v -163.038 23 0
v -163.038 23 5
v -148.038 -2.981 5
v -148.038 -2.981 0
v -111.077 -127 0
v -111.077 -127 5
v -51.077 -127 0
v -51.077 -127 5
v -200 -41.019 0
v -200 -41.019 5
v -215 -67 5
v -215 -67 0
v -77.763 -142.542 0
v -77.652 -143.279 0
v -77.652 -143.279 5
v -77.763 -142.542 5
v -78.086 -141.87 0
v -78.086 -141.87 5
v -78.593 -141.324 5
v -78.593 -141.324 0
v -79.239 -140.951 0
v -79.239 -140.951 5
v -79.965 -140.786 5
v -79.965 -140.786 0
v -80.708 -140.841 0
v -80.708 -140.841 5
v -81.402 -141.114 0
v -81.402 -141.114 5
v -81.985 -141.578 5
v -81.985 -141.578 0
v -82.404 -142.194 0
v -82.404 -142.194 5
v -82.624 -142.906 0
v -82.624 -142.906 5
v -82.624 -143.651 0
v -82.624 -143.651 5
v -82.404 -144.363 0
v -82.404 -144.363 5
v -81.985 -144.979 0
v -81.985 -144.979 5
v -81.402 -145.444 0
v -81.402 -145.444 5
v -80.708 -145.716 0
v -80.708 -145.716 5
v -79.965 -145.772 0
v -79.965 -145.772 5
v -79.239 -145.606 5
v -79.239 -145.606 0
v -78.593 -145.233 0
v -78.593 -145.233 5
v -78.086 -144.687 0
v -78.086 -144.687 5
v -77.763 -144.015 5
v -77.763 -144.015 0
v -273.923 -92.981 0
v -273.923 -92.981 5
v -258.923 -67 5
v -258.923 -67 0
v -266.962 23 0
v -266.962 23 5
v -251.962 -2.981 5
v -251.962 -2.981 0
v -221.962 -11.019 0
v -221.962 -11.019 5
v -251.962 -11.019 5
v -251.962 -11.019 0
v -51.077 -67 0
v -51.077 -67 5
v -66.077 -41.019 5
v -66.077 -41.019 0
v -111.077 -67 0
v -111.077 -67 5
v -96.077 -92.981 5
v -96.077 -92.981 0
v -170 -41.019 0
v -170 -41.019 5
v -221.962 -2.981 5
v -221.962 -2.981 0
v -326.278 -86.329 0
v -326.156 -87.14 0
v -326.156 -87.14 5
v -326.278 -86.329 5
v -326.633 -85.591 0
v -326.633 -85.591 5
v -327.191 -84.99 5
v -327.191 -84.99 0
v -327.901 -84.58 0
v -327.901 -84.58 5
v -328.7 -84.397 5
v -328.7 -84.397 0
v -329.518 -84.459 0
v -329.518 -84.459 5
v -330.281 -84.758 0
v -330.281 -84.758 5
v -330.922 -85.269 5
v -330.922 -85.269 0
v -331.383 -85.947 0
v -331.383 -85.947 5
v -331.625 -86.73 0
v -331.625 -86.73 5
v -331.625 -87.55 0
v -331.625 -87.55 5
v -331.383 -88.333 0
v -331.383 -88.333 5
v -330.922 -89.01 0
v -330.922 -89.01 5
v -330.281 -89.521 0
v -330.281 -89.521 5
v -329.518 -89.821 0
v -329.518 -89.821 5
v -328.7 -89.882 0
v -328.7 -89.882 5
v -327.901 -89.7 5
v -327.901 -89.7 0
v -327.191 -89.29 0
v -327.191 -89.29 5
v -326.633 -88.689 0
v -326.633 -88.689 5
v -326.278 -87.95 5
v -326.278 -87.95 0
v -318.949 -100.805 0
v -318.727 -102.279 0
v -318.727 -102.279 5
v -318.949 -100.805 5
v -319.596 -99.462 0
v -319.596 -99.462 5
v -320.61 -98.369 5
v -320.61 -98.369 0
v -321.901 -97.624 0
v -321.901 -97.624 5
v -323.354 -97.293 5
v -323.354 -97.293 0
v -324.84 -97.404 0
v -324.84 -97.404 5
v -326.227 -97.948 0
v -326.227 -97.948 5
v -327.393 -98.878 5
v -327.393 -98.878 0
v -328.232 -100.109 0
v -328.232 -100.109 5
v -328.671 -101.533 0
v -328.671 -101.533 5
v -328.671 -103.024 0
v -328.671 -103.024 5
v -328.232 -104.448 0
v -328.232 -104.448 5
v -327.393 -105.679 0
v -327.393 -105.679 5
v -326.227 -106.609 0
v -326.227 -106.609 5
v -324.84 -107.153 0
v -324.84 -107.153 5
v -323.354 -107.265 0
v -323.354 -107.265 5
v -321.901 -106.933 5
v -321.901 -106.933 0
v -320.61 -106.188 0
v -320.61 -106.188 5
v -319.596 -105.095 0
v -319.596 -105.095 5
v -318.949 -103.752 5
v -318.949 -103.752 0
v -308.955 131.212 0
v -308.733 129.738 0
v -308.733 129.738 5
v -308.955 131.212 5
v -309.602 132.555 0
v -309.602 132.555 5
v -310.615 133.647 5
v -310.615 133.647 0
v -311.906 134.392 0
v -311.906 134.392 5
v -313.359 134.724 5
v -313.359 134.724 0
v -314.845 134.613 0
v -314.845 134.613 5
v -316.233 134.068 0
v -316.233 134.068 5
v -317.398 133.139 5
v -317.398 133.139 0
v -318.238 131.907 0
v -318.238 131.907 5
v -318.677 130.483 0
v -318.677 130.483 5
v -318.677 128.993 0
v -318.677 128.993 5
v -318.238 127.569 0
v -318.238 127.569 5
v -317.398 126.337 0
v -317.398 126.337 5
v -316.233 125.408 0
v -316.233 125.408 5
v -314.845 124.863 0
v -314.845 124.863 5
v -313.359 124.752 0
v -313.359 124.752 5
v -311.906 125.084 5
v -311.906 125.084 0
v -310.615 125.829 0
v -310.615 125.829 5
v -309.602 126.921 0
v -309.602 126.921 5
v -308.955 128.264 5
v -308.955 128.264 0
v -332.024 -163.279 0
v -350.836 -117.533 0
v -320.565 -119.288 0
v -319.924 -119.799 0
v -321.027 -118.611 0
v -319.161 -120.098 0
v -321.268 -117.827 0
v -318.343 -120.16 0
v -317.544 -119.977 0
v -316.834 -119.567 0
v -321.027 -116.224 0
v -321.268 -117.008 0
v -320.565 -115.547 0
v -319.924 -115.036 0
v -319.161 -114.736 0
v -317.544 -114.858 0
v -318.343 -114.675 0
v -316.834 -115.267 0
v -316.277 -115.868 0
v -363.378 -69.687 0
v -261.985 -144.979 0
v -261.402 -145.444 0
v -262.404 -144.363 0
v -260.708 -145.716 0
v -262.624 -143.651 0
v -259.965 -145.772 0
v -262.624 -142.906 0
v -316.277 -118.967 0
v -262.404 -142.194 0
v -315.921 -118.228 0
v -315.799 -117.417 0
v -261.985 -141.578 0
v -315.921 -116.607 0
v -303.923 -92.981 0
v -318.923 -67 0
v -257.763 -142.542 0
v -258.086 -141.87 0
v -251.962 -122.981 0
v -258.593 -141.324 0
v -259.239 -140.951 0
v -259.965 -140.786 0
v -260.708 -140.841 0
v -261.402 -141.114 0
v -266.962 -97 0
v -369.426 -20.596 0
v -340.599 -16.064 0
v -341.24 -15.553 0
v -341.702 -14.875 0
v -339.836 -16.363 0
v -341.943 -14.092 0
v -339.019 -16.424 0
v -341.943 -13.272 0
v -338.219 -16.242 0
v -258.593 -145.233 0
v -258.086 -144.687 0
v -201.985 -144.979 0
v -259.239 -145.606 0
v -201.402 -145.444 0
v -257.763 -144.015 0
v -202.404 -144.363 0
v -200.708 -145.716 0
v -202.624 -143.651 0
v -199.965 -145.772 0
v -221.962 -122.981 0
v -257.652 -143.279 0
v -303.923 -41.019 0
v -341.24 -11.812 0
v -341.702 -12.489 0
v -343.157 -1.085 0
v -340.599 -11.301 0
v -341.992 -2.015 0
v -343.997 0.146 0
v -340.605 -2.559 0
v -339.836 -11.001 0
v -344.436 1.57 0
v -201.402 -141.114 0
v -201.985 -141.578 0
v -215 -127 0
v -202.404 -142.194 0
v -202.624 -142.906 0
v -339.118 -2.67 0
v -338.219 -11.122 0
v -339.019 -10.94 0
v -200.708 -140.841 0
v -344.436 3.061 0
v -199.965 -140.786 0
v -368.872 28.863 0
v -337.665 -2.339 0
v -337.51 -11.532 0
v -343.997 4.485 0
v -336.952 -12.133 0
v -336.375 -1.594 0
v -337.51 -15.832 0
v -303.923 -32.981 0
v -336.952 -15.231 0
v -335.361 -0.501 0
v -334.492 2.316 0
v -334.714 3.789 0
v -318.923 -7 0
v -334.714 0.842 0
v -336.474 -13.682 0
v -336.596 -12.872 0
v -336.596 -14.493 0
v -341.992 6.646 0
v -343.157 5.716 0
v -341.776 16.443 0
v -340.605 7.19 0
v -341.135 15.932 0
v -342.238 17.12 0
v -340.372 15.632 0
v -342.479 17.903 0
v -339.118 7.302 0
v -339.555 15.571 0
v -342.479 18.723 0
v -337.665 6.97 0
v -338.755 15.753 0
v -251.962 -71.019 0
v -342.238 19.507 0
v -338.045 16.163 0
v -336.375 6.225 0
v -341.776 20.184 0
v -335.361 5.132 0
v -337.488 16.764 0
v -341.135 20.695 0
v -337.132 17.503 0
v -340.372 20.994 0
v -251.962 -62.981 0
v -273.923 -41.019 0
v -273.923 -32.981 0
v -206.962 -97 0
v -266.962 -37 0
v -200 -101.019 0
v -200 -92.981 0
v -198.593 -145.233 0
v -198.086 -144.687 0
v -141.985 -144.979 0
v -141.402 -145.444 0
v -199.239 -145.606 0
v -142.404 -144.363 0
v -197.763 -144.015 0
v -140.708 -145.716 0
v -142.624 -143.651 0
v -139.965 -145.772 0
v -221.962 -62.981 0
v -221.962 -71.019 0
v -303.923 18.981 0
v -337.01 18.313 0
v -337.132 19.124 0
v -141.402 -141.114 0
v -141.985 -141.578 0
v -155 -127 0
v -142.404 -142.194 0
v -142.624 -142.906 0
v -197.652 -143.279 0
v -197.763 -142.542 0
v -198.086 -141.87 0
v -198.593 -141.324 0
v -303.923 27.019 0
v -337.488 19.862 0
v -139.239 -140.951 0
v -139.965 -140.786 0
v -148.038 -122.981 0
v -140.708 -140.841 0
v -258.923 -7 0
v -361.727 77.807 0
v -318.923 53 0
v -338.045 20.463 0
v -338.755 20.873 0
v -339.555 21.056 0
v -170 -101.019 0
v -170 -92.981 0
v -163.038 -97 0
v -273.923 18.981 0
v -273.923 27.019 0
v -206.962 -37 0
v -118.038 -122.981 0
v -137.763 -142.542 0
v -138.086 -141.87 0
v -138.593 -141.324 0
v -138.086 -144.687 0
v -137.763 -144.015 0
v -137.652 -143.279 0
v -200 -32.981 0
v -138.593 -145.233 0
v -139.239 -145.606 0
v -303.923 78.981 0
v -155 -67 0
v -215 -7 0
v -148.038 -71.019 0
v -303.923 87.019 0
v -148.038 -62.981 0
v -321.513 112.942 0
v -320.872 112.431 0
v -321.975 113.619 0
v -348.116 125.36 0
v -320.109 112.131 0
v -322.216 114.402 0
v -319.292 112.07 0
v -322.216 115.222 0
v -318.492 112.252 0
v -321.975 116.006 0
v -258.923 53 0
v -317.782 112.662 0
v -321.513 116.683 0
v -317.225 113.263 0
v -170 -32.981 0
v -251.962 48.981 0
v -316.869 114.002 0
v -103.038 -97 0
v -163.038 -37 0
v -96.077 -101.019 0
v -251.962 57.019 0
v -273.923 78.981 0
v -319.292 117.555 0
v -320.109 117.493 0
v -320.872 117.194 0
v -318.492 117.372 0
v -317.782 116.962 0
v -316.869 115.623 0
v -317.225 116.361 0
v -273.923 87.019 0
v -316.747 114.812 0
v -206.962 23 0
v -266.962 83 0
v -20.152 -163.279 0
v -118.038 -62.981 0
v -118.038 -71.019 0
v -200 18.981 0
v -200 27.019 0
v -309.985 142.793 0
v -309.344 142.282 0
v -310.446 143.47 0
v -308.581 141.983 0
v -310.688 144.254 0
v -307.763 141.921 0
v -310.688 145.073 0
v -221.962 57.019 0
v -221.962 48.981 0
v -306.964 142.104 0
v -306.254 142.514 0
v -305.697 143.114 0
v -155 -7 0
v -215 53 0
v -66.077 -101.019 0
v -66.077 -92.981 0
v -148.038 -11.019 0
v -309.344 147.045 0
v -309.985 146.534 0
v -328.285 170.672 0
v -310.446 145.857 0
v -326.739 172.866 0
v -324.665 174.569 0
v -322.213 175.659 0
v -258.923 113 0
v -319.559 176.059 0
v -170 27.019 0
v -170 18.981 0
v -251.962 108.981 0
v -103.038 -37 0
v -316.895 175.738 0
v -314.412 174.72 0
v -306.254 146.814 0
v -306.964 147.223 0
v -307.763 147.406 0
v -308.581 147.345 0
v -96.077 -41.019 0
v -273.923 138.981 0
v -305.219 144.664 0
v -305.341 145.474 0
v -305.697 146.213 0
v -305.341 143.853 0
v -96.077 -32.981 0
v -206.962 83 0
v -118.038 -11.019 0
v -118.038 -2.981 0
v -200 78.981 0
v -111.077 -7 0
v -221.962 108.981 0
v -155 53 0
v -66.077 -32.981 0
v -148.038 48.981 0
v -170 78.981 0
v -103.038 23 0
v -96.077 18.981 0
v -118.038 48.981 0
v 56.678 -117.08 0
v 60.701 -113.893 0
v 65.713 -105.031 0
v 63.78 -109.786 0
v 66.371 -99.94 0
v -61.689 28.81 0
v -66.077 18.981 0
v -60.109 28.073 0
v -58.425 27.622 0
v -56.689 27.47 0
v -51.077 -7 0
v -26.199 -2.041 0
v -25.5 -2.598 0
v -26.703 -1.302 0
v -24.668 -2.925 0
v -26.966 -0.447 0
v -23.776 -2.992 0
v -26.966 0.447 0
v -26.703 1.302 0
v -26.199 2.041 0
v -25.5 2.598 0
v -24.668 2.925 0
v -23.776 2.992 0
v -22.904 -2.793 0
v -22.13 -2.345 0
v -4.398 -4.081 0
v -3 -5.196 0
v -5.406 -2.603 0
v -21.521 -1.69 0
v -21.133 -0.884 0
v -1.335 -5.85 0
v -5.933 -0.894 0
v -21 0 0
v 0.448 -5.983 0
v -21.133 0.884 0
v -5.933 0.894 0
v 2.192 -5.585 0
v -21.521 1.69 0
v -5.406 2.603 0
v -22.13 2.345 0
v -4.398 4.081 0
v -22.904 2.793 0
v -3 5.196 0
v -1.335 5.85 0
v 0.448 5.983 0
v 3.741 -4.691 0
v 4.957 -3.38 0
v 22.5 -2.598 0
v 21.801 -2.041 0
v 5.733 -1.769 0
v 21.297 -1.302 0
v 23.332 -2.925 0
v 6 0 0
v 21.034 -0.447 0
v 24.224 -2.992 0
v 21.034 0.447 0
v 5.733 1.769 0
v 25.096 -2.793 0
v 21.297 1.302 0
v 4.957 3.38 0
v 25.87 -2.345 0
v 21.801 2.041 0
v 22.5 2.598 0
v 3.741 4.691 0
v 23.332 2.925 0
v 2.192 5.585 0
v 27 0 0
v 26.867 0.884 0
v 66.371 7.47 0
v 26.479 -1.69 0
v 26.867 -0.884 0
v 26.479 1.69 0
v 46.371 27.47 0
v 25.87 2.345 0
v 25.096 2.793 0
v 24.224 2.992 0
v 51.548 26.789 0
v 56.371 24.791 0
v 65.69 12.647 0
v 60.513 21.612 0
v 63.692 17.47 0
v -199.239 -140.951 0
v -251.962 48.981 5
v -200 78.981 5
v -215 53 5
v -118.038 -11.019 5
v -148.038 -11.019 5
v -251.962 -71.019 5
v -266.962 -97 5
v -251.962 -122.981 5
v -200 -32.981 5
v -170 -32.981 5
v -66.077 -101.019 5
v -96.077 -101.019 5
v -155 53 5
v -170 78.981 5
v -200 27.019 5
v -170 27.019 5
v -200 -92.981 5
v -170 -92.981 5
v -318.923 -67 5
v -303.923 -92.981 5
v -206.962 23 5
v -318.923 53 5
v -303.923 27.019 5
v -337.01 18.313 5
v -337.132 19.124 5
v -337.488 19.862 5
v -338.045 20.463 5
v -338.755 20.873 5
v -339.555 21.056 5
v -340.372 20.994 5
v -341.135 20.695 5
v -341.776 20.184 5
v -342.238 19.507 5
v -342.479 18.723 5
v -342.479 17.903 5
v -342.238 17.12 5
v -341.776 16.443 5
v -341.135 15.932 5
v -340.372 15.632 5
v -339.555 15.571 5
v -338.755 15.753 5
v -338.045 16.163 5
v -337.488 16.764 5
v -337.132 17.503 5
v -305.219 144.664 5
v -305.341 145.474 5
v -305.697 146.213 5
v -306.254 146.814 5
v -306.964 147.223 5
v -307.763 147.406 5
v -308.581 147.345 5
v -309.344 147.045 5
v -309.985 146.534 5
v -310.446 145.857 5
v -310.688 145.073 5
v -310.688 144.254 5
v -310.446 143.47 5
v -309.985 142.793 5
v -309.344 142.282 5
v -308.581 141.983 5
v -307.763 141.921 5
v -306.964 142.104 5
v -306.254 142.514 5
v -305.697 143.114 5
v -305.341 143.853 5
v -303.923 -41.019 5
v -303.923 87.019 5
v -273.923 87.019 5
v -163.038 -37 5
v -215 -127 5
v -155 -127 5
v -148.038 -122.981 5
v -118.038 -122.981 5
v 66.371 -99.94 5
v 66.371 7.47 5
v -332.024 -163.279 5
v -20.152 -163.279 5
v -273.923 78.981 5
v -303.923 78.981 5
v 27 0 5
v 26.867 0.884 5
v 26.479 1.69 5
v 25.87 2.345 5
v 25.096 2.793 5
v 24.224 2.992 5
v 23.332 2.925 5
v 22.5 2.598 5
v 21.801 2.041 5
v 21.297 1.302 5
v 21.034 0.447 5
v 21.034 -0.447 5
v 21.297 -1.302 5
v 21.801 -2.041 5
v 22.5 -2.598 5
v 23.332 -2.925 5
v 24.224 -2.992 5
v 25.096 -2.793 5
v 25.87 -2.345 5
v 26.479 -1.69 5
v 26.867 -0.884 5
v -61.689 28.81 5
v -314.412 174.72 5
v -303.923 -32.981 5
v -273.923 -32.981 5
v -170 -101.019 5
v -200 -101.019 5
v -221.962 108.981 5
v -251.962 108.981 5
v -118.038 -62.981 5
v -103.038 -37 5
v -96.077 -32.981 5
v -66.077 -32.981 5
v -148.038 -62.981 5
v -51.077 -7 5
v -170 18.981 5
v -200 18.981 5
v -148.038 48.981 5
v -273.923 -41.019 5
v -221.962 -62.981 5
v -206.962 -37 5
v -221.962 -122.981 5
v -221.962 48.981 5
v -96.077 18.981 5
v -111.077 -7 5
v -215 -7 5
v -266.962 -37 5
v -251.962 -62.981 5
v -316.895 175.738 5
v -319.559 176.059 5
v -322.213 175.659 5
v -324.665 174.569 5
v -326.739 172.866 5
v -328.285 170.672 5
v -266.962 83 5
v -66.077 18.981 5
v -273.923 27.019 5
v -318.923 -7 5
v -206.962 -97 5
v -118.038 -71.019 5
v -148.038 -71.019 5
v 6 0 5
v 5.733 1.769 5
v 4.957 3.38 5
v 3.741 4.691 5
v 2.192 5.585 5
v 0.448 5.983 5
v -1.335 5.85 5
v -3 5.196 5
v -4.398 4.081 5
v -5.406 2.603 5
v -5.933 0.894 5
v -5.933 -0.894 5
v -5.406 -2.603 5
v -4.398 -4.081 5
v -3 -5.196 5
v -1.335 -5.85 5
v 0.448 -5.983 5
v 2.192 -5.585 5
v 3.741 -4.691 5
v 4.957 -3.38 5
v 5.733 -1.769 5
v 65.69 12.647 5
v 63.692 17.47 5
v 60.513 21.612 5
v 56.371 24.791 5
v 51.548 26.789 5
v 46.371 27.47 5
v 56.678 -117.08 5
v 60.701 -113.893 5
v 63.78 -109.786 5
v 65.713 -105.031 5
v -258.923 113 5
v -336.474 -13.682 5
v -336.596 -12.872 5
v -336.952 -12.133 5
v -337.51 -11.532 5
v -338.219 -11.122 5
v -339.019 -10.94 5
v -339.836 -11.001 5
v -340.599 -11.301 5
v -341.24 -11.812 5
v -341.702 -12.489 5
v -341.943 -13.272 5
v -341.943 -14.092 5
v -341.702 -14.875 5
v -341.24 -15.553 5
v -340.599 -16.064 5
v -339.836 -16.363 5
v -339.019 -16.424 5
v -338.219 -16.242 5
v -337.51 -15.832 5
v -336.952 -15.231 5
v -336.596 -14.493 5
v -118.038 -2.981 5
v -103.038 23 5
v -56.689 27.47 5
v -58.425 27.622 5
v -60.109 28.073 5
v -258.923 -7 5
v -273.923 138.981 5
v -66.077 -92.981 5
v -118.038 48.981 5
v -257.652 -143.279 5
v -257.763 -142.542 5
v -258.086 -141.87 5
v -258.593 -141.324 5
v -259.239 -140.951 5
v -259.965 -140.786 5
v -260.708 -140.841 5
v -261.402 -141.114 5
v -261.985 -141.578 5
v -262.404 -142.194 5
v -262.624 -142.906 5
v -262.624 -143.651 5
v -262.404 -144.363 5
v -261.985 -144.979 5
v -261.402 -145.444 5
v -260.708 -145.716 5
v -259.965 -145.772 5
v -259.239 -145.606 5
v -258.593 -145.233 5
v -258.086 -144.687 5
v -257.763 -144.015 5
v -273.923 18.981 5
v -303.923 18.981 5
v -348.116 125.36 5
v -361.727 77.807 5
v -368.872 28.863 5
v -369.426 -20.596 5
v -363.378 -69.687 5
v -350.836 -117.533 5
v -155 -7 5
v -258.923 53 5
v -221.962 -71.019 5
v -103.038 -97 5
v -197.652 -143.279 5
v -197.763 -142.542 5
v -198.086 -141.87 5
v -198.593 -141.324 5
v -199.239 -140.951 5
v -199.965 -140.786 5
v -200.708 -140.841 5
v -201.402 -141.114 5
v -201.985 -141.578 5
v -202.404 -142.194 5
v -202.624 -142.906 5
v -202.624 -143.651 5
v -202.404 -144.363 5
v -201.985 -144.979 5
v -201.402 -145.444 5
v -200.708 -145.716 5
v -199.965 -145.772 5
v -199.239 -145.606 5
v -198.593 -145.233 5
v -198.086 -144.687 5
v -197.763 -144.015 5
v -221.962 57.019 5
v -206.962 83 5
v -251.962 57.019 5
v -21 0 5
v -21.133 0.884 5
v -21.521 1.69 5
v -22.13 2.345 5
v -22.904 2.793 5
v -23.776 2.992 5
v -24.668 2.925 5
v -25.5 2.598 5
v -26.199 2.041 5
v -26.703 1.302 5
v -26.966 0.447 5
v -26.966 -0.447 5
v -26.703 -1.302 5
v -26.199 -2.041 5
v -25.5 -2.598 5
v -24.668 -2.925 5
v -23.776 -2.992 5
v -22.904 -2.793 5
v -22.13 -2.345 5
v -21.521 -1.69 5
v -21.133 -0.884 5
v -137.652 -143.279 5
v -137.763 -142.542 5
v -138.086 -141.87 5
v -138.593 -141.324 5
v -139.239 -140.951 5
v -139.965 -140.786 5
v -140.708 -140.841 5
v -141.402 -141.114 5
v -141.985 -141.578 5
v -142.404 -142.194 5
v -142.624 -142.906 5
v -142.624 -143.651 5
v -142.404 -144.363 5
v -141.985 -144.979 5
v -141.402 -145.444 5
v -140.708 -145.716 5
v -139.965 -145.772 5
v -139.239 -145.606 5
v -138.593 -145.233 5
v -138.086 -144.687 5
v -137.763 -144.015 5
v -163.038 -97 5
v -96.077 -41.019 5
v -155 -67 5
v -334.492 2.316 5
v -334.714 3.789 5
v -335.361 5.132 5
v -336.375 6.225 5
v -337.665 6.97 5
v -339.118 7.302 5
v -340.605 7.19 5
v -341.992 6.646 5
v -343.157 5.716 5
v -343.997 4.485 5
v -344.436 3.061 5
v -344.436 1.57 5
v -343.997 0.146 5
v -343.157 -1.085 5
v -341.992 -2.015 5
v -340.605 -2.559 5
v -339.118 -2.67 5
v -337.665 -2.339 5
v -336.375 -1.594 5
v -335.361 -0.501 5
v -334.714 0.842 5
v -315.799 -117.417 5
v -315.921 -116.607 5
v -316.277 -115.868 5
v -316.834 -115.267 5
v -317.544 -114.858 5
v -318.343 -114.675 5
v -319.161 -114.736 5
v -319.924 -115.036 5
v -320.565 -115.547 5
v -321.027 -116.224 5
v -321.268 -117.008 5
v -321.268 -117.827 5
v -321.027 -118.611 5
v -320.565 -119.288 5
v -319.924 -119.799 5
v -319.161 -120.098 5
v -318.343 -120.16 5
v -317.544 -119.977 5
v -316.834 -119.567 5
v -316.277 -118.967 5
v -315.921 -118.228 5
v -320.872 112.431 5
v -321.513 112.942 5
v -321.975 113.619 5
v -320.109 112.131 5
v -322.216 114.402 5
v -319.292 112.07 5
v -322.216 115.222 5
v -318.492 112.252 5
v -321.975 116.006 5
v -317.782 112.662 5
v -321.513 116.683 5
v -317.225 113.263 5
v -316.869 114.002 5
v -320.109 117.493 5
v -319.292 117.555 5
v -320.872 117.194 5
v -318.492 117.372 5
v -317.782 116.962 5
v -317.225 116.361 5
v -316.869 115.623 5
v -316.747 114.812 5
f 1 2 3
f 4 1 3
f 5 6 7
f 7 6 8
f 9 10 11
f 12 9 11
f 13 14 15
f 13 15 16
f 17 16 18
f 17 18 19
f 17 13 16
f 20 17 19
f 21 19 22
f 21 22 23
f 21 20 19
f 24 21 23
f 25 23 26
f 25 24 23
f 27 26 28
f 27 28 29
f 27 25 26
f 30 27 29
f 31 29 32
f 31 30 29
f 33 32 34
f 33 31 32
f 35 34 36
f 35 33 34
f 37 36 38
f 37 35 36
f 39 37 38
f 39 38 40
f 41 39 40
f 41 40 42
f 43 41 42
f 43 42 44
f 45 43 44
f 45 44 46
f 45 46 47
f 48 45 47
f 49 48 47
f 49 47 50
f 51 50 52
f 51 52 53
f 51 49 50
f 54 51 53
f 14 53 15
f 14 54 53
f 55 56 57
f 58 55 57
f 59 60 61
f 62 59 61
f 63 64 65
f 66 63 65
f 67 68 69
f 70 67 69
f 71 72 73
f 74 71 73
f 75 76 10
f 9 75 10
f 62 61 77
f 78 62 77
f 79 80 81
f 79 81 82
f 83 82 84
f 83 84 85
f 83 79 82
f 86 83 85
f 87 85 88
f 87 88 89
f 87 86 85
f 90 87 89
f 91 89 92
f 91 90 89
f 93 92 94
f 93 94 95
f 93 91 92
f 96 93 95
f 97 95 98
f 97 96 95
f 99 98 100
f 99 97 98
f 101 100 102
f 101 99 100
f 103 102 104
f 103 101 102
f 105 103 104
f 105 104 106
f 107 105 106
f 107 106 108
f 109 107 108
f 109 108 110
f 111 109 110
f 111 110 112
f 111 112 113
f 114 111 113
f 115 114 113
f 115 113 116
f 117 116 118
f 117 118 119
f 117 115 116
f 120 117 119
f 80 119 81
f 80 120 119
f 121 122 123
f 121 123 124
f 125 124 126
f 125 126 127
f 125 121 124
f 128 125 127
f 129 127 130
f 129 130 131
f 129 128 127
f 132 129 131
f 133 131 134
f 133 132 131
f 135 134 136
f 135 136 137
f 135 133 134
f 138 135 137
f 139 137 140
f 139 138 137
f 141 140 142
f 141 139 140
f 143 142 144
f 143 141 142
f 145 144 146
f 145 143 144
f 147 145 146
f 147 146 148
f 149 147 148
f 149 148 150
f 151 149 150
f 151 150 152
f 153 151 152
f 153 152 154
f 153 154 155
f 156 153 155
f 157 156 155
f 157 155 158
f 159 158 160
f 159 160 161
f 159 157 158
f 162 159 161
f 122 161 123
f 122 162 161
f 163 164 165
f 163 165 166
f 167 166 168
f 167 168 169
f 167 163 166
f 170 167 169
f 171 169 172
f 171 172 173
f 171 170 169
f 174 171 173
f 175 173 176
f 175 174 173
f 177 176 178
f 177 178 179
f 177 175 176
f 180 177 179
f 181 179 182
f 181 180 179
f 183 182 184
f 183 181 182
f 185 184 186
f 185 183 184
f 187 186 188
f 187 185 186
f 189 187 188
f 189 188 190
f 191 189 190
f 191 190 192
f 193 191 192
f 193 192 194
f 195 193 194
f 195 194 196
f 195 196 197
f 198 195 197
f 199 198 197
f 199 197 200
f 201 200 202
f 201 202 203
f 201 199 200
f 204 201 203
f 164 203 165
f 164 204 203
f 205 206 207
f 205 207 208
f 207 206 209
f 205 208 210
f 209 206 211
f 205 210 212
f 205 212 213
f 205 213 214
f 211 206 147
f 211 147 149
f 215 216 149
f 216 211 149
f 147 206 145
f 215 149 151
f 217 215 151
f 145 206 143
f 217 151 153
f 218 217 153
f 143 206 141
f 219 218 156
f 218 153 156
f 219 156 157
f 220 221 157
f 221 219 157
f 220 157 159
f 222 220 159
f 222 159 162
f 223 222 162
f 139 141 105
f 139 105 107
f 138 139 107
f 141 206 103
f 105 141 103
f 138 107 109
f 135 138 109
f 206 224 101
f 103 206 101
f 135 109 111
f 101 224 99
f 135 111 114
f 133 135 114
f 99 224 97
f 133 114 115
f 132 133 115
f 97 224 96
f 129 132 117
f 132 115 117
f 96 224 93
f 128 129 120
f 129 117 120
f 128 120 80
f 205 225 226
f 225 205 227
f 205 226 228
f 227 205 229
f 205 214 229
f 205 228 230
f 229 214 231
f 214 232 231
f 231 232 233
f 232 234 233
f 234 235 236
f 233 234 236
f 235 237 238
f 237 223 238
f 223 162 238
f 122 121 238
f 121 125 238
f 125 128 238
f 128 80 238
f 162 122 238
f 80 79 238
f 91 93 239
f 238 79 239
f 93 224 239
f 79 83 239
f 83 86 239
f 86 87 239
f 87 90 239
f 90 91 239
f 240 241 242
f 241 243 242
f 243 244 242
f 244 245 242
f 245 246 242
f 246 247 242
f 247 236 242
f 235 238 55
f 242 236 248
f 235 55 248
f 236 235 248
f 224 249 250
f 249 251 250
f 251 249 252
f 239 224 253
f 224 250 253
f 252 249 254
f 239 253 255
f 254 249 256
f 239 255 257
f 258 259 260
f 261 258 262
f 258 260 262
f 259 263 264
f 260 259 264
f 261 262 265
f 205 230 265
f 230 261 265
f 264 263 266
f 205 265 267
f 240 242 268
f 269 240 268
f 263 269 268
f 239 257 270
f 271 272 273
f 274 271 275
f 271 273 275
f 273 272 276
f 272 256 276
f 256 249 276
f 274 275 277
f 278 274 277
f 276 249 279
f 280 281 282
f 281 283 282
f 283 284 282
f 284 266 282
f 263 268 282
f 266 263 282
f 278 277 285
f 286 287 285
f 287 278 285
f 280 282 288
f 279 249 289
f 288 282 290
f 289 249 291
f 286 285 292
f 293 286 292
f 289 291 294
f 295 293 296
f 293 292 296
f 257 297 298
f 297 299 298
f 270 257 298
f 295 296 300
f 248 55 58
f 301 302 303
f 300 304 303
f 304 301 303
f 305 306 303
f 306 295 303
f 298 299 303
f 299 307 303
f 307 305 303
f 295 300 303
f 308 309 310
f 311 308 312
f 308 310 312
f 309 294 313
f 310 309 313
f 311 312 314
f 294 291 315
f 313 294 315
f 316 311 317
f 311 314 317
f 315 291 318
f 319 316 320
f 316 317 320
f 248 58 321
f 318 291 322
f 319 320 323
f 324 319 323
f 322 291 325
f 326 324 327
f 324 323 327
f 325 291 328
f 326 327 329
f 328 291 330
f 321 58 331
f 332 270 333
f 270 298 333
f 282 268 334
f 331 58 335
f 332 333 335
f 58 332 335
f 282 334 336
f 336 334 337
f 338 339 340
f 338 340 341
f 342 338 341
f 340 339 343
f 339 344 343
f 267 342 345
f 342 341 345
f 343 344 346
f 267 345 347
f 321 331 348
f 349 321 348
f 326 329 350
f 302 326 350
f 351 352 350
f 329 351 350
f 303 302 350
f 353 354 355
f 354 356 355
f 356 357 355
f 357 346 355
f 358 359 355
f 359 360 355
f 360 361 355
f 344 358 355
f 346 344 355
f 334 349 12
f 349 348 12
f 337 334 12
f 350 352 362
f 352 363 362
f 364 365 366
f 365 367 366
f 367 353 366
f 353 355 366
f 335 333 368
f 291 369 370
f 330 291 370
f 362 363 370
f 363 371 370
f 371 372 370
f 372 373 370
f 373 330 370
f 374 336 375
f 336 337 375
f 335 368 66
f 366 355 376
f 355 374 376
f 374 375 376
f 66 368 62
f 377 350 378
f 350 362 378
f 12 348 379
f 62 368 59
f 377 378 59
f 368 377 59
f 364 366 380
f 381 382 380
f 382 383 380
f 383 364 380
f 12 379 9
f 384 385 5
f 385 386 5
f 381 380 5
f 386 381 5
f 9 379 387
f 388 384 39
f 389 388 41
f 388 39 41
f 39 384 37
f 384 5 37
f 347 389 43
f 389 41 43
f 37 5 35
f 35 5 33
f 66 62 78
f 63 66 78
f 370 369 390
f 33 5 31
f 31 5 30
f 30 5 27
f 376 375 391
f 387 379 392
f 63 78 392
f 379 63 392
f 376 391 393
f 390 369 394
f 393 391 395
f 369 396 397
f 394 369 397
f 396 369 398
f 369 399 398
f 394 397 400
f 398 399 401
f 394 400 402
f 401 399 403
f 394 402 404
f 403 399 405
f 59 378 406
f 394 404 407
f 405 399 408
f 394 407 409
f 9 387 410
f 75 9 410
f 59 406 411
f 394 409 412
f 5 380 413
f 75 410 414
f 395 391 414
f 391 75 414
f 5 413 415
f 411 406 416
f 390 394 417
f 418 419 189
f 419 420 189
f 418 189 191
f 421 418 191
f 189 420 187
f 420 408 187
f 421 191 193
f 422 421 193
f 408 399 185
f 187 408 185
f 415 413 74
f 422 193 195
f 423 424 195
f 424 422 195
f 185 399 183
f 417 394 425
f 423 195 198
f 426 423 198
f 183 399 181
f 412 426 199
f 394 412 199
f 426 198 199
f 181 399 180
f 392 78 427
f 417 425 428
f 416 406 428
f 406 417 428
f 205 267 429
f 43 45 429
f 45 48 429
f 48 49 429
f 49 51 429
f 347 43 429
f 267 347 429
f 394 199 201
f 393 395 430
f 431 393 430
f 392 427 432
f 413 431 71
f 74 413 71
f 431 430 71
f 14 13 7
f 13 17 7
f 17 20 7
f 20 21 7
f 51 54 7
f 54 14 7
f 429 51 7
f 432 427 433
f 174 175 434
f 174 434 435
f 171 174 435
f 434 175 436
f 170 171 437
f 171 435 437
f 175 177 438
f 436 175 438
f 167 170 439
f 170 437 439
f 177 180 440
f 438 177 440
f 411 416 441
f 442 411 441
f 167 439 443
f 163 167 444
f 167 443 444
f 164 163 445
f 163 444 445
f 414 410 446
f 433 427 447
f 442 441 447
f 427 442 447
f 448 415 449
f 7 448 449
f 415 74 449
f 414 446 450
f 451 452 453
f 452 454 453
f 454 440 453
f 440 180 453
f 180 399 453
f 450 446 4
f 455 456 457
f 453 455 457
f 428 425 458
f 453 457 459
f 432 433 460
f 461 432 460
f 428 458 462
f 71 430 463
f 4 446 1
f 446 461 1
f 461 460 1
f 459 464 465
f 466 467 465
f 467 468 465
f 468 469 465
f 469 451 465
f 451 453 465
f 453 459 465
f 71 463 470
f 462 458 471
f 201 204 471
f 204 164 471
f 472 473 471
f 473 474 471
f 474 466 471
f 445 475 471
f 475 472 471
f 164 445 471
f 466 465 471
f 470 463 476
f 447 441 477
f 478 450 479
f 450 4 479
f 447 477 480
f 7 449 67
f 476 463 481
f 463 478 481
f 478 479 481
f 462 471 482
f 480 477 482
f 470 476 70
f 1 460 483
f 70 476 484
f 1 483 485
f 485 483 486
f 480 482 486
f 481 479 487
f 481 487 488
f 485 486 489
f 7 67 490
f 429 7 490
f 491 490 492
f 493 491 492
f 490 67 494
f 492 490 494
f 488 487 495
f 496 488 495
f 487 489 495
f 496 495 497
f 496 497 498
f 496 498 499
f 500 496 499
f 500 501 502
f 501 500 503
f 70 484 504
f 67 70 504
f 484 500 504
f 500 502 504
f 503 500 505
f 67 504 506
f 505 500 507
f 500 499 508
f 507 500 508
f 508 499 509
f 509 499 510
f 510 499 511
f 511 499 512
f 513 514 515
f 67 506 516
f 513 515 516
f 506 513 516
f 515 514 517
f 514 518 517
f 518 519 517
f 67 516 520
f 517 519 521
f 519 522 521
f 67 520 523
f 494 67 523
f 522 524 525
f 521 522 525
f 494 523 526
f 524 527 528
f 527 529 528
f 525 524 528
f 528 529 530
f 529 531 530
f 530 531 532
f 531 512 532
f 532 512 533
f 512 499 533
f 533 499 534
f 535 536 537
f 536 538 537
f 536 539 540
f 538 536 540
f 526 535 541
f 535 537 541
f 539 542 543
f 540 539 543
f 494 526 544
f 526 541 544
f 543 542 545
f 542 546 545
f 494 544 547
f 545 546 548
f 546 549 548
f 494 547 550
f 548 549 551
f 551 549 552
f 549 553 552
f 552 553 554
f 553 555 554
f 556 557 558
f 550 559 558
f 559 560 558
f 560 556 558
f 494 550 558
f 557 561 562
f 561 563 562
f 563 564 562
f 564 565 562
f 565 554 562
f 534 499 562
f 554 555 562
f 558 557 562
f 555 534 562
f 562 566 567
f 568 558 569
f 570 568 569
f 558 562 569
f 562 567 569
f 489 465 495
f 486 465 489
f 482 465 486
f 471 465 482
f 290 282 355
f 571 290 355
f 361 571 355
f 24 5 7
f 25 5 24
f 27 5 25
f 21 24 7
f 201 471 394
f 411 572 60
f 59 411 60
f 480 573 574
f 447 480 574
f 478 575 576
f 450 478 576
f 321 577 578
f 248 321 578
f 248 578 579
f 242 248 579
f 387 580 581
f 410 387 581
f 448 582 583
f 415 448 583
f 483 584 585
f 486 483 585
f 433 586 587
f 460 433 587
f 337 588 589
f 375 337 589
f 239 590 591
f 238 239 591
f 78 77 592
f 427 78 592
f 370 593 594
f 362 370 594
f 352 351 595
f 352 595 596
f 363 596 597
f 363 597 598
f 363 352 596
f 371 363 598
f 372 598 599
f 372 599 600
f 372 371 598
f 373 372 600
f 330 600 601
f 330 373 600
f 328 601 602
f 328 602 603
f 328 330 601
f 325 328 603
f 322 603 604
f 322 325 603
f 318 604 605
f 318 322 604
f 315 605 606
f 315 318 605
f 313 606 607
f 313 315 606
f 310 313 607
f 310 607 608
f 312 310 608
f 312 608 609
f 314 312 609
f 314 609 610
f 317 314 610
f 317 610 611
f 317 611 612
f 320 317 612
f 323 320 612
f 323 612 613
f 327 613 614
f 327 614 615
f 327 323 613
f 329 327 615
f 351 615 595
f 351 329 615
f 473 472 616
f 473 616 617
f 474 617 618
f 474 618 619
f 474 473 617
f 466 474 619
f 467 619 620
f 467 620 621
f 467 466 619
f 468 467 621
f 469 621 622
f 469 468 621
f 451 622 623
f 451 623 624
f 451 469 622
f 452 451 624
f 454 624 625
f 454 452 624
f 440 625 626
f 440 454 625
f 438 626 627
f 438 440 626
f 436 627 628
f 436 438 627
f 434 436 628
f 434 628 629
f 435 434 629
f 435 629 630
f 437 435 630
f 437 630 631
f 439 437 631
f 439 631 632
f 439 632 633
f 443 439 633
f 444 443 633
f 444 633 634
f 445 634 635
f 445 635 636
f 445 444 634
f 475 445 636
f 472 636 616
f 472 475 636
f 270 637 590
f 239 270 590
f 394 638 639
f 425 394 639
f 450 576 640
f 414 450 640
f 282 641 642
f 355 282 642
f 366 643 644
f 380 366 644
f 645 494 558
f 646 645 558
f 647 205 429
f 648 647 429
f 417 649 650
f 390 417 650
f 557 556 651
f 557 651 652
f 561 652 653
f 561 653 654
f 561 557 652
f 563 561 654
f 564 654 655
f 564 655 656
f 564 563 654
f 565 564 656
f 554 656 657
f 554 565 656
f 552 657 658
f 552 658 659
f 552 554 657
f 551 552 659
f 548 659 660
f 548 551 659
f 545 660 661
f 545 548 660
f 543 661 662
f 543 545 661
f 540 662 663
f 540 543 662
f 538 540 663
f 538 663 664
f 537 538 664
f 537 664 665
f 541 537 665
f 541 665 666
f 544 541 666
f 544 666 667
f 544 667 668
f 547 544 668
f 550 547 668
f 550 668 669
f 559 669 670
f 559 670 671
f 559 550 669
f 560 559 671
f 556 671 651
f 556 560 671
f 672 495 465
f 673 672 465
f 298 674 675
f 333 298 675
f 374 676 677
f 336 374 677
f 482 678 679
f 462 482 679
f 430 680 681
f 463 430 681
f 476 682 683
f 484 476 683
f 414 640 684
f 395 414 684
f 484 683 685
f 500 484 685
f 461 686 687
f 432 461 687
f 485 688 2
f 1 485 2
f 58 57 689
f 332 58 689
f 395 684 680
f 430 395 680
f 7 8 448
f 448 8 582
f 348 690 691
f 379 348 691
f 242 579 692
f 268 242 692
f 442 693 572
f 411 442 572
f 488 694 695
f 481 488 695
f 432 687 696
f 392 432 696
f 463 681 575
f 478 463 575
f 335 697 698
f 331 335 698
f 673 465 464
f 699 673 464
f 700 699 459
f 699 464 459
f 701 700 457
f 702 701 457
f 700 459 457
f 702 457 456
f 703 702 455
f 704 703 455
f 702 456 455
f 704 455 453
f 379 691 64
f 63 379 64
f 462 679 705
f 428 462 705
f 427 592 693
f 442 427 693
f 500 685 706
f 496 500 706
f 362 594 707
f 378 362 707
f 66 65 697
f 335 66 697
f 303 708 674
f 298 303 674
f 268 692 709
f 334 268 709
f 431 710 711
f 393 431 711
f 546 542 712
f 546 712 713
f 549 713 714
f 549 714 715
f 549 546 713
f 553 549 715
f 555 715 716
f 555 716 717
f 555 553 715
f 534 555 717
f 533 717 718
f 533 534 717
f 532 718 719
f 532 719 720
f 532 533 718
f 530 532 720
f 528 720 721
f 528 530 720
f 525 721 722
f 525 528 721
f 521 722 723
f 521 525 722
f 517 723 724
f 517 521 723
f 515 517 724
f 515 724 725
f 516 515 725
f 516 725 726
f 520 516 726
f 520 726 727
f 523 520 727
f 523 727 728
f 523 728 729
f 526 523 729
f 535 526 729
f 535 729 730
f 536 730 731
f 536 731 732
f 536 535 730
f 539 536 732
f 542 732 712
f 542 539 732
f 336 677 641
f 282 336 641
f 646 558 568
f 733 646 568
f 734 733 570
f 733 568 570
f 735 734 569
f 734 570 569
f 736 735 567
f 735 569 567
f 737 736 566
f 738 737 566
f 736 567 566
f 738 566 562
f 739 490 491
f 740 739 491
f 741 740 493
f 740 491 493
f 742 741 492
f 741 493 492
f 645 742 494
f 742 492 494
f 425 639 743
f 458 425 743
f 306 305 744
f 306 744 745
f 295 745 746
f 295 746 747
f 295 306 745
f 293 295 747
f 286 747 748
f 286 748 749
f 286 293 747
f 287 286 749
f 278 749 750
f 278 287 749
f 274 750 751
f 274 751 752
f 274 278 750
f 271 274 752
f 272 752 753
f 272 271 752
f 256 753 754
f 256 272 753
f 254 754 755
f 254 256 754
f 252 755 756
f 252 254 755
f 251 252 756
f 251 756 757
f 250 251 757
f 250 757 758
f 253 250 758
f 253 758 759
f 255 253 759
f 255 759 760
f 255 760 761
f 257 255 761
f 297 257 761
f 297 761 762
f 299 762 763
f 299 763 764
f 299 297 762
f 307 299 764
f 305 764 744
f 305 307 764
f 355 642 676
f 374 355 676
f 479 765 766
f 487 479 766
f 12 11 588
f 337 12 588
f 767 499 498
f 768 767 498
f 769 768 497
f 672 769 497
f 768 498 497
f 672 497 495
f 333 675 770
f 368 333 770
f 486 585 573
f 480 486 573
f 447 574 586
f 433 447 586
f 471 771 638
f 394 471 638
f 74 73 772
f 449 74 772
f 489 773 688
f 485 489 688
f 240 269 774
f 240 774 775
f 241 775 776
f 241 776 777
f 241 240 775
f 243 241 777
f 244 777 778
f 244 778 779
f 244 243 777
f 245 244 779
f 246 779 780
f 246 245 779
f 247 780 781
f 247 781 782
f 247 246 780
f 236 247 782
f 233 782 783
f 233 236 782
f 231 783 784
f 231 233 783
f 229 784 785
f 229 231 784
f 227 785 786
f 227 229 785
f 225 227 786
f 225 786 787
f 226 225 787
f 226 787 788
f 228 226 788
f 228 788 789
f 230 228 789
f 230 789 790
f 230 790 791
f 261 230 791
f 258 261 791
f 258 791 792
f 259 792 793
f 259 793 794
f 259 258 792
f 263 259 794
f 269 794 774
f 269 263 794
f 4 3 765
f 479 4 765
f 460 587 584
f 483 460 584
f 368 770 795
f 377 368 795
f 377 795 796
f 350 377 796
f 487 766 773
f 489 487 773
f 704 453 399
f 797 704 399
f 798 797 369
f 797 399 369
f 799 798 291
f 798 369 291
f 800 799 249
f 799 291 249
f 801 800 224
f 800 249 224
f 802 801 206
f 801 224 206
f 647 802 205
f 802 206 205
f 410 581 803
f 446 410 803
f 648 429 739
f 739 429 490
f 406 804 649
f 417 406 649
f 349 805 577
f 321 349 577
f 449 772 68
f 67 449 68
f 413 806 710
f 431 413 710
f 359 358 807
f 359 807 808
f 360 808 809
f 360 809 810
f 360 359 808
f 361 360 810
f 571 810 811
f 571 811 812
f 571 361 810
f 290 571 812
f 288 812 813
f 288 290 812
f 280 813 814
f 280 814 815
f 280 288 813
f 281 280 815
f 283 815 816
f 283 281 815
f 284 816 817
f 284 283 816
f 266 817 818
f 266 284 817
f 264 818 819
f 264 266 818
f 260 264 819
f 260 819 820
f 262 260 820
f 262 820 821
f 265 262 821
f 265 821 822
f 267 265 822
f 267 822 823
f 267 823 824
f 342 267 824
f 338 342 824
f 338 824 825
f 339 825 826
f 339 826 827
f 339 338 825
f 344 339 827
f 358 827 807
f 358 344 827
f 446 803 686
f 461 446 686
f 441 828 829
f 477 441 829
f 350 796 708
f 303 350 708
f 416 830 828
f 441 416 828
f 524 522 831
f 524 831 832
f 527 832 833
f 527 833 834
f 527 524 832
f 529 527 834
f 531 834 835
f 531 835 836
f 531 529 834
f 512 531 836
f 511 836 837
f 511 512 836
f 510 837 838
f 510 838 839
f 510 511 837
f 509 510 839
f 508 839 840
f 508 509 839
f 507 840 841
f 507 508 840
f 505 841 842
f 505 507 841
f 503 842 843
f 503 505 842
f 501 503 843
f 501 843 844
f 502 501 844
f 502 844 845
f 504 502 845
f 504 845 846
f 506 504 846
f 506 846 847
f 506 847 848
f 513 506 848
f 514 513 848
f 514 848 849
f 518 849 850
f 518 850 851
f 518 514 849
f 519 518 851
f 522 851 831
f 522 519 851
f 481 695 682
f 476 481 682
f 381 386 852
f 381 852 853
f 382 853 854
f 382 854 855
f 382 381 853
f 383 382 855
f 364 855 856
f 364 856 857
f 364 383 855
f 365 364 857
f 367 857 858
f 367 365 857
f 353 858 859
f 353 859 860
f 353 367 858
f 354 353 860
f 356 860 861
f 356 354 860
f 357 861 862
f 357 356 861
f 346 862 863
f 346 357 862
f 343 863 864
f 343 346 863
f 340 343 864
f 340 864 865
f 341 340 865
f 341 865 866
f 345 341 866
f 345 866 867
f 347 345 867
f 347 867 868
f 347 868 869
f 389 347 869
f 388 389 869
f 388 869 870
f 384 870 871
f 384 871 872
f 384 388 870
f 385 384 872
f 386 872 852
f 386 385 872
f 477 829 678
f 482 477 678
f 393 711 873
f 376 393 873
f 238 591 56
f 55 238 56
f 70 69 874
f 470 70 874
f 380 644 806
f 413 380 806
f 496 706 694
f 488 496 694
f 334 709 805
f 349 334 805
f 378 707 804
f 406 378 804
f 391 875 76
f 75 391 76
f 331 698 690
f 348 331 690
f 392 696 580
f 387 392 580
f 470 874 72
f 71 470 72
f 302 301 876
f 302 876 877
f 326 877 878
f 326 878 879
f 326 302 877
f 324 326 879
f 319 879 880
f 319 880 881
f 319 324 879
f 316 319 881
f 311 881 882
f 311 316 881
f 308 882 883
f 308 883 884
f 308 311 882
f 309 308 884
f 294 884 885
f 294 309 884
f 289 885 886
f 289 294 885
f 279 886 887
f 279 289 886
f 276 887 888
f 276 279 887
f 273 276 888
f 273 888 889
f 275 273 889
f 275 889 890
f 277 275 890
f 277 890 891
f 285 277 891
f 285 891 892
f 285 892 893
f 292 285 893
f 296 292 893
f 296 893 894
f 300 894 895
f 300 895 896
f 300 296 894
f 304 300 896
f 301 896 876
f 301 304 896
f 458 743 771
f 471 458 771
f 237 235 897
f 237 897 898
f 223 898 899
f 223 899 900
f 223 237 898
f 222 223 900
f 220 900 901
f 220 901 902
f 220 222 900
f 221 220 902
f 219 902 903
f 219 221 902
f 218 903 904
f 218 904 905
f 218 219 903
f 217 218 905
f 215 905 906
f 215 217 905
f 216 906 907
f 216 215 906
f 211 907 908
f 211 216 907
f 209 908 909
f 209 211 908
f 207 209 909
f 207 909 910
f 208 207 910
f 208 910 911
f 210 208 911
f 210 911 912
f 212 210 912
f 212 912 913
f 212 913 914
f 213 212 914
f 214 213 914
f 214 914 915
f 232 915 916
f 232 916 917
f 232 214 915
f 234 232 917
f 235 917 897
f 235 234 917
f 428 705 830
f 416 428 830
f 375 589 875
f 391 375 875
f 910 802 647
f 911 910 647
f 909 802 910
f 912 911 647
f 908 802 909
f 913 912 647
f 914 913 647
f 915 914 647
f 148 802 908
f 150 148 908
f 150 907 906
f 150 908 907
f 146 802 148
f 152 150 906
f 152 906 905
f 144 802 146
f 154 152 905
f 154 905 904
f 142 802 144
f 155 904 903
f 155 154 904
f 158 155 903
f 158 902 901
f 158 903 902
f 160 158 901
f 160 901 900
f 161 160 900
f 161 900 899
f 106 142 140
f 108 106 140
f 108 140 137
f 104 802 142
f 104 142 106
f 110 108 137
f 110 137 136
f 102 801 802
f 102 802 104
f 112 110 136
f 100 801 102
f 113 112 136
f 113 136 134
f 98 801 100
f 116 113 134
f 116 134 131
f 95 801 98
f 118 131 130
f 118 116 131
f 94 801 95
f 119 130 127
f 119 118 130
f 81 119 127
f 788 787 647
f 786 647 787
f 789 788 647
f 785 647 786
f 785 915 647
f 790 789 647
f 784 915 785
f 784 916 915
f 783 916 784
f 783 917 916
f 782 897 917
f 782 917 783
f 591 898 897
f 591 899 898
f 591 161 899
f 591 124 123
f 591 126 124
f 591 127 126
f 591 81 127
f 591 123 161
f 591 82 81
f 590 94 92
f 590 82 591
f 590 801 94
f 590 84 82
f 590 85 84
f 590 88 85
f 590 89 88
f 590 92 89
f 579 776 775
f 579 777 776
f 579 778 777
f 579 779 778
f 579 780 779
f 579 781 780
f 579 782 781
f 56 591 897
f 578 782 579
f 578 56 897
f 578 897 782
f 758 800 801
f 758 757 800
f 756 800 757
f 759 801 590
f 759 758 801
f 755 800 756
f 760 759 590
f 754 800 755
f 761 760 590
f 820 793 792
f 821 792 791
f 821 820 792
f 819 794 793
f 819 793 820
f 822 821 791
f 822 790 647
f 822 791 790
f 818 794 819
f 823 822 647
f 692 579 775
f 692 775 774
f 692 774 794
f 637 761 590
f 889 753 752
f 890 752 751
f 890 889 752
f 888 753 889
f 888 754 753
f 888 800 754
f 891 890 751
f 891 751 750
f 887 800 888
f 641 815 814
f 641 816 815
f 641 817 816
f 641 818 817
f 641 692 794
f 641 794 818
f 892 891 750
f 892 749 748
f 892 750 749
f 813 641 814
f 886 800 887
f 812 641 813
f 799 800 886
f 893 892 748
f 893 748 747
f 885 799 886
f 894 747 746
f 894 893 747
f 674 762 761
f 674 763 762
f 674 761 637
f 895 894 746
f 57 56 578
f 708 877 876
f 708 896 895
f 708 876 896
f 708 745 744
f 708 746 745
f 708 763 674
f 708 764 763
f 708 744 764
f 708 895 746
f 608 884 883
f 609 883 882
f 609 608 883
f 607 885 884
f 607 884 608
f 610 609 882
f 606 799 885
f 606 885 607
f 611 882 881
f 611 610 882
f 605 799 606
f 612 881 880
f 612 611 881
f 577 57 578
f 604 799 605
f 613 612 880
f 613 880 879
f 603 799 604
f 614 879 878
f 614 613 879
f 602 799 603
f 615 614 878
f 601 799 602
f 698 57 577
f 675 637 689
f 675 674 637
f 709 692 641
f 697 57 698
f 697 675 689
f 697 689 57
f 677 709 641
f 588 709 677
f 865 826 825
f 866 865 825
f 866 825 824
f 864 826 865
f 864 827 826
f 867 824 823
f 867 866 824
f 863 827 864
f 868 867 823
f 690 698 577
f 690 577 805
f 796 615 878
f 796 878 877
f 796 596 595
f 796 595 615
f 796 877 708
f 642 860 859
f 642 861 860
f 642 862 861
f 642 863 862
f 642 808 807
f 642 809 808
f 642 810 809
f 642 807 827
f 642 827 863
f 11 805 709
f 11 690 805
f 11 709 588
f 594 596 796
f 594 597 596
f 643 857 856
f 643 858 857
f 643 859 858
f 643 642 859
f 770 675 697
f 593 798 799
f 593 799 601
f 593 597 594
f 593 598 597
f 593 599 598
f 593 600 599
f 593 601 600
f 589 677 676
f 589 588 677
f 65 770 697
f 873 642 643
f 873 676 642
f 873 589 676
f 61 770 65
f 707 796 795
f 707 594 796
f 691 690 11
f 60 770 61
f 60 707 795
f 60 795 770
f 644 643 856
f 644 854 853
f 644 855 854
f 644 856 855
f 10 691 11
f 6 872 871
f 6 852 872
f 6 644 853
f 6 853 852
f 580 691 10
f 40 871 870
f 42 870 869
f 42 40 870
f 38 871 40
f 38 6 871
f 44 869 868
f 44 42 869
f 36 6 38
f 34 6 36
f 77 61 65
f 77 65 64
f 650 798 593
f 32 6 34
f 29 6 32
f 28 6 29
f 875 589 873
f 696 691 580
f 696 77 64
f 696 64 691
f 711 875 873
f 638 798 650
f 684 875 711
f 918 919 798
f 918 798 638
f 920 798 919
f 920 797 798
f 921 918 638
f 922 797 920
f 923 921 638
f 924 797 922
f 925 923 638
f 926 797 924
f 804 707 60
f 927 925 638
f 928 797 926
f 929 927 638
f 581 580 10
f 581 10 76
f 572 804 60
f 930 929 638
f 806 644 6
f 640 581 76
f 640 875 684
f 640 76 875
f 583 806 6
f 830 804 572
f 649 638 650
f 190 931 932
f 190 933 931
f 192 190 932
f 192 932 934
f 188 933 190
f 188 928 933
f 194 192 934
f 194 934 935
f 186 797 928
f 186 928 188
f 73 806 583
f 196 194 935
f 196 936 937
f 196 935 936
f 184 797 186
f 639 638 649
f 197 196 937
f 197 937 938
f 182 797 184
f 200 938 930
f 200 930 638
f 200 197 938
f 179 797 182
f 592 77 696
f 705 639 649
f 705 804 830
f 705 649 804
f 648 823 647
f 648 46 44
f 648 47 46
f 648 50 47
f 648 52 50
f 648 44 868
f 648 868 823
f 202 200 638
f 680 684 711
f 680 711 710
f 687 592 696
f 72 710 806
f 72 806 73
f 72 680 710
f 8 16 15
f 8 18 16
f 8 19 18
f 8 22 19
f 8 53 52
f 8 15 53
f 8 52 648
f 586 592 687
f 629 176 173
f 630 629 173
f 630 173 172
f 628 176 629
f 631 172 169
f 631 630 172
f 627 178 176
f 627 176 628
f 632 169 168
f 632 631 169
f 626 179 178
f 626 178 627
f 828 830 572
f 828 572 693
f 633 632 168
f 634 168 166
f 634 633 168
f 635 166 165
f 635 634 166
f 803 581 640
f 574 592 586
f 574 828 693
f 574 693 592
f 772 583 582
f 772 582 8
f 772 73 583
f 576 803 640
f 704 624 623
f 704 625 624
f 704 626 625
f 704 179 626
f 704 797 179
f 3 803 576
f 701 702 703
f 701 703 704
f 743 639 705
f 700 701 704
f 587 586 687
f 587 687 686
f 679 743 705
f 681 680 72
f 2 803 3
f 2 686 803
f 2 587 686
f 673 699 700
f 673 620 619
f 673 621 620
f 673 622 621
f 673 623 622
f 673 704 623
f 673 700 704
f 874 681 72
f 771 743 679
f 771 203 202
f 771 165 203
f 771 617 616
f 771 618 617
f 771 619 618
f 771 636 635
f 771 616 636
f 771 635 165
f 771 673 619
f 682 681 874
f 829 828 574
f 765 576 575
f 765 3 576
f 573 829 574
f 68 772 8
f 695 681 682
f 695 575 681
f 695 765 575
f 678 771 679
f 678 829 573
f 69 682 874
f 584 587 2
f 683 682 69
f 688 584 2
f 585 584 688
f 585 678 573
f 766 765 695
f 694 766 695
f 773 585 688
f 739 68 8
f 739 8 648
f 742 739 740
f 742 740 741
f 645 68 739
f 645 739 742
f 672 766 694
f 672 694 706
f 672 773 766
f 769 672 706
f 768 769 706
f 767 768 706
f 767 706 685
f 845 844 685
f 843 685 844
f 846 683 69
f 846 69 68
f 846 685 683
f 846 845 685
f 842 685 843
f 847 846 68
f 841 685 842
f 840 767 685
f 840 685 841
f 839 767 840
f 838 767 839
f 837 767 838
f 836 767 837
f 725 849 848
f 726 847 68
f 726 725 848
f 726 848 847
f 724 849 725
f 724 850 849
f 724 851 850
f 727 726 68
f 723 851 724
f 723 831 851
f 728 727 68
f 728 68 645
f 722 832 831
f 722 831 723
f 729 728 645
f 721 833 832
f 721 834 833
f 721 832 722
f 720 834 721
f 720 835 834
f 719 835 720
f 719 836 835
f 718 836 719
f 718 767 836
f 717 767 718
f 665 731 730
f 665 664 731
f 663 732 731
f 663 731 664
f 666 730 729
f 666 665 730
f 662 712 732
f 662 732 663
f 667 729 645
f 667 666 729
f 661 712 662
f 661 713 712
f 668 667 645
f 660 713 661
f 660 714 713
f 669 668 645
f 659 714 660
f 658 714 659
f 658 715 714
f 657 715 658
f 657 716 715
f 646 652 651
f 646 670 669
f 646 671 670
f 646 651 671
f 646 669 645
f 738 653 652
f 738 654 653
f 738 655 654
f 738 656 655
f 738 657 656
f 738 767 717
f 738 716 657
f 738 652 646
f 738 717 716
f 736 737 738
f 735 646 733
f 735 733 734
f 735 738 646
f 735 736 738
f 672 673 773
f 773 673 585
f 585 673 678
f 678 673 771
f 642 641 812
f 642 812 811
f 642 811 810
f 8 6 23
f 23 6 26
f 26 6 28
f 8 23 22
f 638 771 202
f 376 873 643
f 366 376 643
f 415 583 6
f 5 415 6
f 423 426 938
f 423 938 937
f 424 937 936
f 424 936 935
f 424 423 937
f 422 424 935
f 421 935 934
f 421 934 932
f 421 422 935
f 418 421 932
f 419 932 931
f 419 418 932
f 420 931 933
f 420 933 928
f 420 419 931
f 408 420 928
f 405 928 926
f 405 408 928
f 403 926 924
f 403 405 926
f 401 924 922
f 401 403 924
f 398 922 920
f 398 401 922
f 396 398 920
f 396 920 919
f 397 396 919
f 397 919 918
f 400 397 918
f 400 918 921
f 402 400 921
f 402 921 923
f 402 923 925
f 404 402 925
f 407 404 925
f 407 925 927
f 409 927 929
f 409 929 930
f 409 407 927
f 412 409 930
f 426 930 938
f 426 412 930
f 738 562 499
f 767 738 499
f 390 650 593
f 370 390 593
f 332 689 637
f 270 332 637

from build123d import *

# Parameters (mm, degrees)
BOSS_EXTRUDE1_OUTLINE_R   = 2.75
BOSS_EXTRUDE1_OUTLINE_R_2 = 5
BOSS_EXTRUDE1_OUTLINE_R_3 = 2.499999993
BOSS_EXTRUDE1_OUTLINE_R_4 = 3
BOSS_EXTRUDE1_OUTLINE_R_5 = 6
BOSS_EXTRUDE1_DEPTH       = 5
CUT_EXTRUDE1_DEPTH        = 5


# Read off the part's stored shape, not the designer's step: Boss-Extrude1
with BuildPart() as part:
    # Boss-Extrude1 outline → Boss-Extrude1 (new body)
    with BuildSketch(Plane.XY):
        with BuildLine():
            ThreePointArc((56.677553307, -117.080446425), (63.779903671, -109.786095566), (66.371177049, -99.940475351))
            Line((66.371177049, -99.940475351), (66.371177049, 7.470187014))
            ThreePointArc((66.371177049, 7.470187014), (60.513312673, 21.612322638), (46.371177049, 27.470187014))
            Line((46.371177049, 27.470187014), (-56.688822951, 27.470187014))
            ThreePointArc((-56.688822951, 27.470187014), (-59.277013402, 27.810928751), (-61.688822951, 28.809932976))
            Line((-61.688822951, 28.809932976), (-314.412271613, 174.719884092))
            ThreePointArc((-314.412271613, 174.719884092), (-322.213114889, 175.659384058), (-328.284834714, 170.672397556))
            ThreePointArc((-328.284834714, 170.672397556), (-369.976805992, 4.142827069), (-332.024261256, -163.278565422))
            Line((-332.024261256, -163.278565422), (-20.152013506, -163.278565422))
            Line((-20.152013506, -163.278565422), (56.677553307, -117.080446425))
        make_face()
        with Locations((-318.548901543, -117.417406357)):
            Circle(BOSS_EXTRUDE1_OUTLINE_R, mode=Mode.SUBTRACT)
        with Locations((-323.727269541, -102.278565422)):
            Circle(BOSS_EXTRUDE1_OUTLINE_R_2, mode=Mode.SUBTRACT)
        with Locations((-328.90563754, -87.139724486)):
            Circle(BOSS_EXTRUDE1_OUTLINE_R, mode=Mode.SUBTRACT)
        with Locations((-260.152013506, -143.278565422)):
            Circle(BOSS_EXTRUDE1_OUTLINE_R_3, mode=Mode.SUBTRACT)
        with Locations((-200.152013506, -143.278565422)):
            Circle(BOSS_EXTRUDE1_OUTLINE_R_3, mode=Mode.SUBTRACT)
        with Locations((-339.2241853, -13.682181731)):
            Circle(BOSS_EXTRUDE1_OUTLINE_R, mode=Mode.SUBTRACT)
        with Locations((-339.492103151, 2.315574988)):
            Circle(BOSS_EXTRUDE1_OUTLINE_R_2, mode=Mode.SUBTRACT)
        with Locations((-140.152013506, -143.278565422)):
            Circle(BOSS_EXTRUDE1_OUTLINE_R_3, mode=Mode.SUBTRACT)
        with Locations((-80.152013506, -143.278565422)):
            Circle(BOSS_EXTRUDE1_OUTLINE_R_3, mode=Mode.SUBTRACT)
        with Locations((-24, 0)):
            Circle(BOSS_EXTRUDE1_OUTLINE_R_4, mode=Mode.SUBTRACT)
        with Locations((1.6e-08, 2e-09)):
            Circle(BOSS_EXTRUDE1_OUTLINE_R_5, mode=Mode.SUBTRACT)
        with Locations((24, 0)):
            Circle(BOSS_EXTRUDE1_OUTLINE_R_4, mode=Mode.SUBTRACT)
        with Locations((-339.760021002, 18.313331706)):
            Circle(BOSS_EXTRUDE1_OUTLINE_R, mode=Mode.SUBTRACT)
        with Locations((-319.497069854, 114.812335336)):
            Circle(BOSS_EXTRUDE1_OUTLINE_R, mode=Mode.SUBTRACT)
        with Locations((-313.732870505, 129.737951098)):
            Circle(BOSS_EXTRUDE1_OUTLINE_R_2, mode=Mode.SUBTRACT)
        with Locations((-307.968671157, 144.66356686)):
            Circle(BOSS_EXTRUDE1_OUTLINE_R, mode=Mode.SUBTRACT)
    extrude(amount=BOSS_EXTRUDE1_DEPTH)

    # Sketch2 → Cut-Extrude1 (cut)
    with BuildSketch(Plane.XY.offset(5)):
        Polygon((-155, -7), (-170, 18.980762114), (-200, 18.980762114), (-215, -7), (-200, -32.980762114), (-170, -32.980762114), align=None)
        Polygon((-103.038475773, -37), (-118.038475773, -11.019237886), (-148.038475773, -11.019237886), (-163.038475773, -37), (-148.038475773, -62.980762114), (-118.038475773, -62.980762114), align=None)
        Polygon((-215, -127), (-155, -127), (-170, -101.019237886), (-200, -101.019237886), align=None)
        Polygon((-111.076951546, -127), (-51.076951546, -127), (-66.076951546, -101.019237886), (-96.076951546, -101.019237886), align=None)
        Polygon((-51.076951546, -67), (-66.076951546, -41.019237886), (-96.076951546, -41.019237886), (-111.076951546, -67), (-96.076951546, -92.980762114), (-66.076951546, -92.980762114), align=None)
        Polygon((-118.038475773, -2.980762114), (-103.038475773, 23), (-118.038475773, 48.980762114), (-148.038475773, 48.980762114), (-163.038475773, 23), (-148.038475773, -2.980762114), align=None)
        Polygon((-258.923048454, 53), (-273.923048454, 78.980762114), (-303.923048454, 78.980762114), (-318.923048454, 53), (-303.923048454, 27.019237886), (-273.923048454, 27.019237886), align=None)
        Polygon((-206.961524227, 23), (-221.961524227, 48.980762114), (-251.961524227, 48.980762114), (-266.961524227, 23), (-251.961524227, -2.980762114), (-221.961524227, -2.980762114), align=None)
        Polygon((-221.961524227, 57.019237886), (-206.961524227, 83), (-221.961524227, 108.980762114), (-251.961524227, 108.980762114), (-266.961524227, 83), (-251.961524227, 57.019237886), align=None)
        Polygon((-170, 27.019237886), (-155, 53), (-170, 78.980762114), (-200, 78.980762114), (-215, 53), (-200, 27.019237886), align=None)
        Polygon((-66.076951546, -32.980762114), (-51.076951546, -7), (-66.076951546, 18.980762114), (-96.076951546, 18.980762114), (-111.076951546, -7), (-96.076951546, -32.980762114), align=None)
        Polygon((-103.038475773, -97), (-118.038475773, -71.019237886), (-148.038475773, -71.019237886), (-163.038475773, -97), (-148.038475773, -122.980762114), (-118.038475773, -122.980762114), align=None)
        Polygon((-170, -41.019237886), (-200, -41.019237886), (-215, -67), (-200, -92.980762114), (-170, -92.980762114), (-155, -67), align=None)
        Polygon((-273.923048454, -32.980762114), (-258.923048454, -7), (-273.923048454, 18.980762114), (-303.923048454, 18.980762114), (-318.923048454, -7), (-303.923048454, -32.980762114), align=None)
        Polygon((-221.961524227, -62.980762114), (-206.961524227, -37), (-221.961524227, -11.019237886), (-251.961524227, -11.019237886), (-266.961524227, -37), (-251.961524227, -62.980762114), align=None)
        Polygon((-273.923048454, 87.019237886), (-258.923048454, 113), (-273.923048454, 138.980762114), (-303.923048454, 87.019237886), align=None)
        Polygon((-303.923048454, -92.980762114), (-273.923048454, -92.980762114), (-258.923048454, -67), (-273.923048454, -41.019237886), (-303.923048454, -41.019237886), (-318.923048454, -67), align=None)
        Polygon((-206.961524227, -97), (-221.961524227, -71.019237886), (-251.961524227, -71.019237886), (-266.961524227, -97), (-251.961524227, -122.980762114), (-221.961524227, -122.980762114), align=None)
    extrude(amount=-CUT_EXTRUDE1_DEPTH, mode=Mode.SUBTRACT)


solid = part.part
